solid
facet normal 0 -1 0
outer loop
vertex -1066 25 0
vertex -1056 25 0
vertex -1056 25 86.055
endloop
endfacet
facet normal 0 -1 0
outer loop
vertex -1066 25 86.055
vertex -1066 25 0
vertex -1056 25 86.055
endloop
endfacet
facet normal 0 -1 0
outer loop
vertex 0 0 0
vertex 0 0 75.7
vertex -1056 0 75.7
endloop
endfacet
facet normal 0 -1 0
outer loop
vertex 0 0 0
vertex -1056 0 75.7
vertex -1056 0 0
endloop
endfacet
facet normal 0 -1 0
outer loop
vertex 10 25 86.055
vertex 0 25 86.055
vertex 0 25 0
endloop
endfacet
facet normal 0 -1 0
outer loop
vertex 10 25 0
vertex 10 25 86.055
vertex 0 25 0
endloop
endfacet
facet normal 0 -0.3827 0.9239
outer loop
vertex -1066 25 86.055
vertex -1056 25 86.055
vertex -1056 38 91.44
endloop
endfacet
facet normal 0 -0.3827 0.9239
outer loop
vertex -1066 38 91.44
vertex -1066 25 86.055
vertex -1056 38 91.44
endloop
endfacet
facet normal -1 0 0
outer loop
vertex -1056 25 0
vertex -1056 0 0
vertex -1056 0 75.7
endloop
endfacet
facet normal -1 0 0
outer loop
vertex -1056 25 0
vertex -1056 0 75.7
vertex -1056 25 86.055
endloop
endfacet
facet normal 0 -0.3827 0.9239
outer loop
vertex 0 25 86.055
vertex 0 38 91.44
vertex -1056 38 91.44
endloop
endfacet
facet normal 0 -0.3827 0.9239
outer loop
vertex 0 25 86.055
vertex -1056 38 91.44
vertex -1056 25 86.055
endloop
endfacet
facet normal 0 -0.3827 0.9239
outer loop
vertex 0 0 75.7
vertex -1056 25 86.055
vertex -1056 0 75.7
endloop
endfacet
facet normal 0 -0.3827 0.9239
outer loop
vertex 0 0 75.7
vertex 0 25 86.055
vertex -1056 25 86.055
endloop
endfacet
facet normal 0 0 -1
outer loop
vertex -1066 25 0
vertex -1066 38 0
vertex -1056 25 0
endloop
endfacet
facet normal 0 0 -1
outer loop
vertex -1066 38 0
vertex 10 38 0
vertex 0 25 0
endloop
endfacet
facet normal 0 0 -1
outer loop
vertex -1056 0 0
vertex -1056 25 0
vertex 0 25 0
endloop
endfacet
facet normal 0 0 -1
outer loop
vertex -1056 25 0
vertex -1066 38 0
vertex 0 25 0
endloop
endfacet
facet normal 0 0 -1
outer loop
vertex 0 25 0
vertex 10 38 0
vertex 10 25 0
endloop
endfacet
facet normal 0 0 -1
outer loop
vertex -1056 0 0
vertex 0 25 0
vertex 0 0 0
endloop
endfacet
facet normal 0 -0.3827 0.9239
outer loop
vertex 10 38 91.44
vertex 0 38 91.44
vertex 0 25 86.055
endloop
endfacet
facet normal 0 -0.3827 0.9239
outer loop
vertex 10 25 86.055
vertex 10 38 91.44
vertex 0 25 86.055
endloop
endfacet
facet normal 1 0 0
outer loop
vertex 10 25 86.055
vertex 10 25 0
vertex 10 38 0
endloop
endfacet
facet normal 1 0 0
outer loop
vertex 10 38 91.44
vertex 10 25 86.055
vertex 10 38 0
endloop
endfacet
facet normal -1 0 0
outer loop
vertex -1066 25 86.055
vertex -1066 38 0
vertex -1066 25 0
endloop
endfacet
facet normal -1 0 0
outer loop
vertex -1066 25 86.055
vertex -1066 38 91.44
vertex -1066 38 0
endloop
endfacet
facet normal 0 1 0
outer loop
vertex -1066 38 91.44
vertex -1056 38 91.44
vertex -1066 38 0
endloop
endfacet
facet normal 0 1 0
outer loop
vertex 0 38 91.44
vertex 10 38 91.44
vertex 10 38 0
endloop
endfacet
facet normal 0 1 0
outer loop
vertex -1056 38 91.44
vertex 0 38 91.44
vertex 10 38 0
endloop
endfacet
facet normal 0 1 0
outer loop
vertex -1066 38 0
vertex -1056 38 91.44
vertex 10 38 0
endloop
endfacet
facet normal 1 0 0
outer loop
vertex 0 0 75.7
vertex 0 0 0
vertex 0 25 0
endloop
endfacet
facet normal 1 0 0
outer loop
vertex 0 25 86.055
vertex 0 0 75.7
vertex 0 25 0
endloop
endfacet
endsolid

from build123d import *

# Parameters (mm, degrees)
F1_DEPTH = 1056
F3_DEPTH = 10
F5_DEPTH = 10


with BuildPart() as f1:
    # F0 (on Right) → F1 (new body)
    with BuildSketch(Plane.YZ):
        Polygon((0, 75.7), (0, 0), (38, 0), (38, 91.440115), align=None)
    extrude(amount=-F1_DEPTH)

    # F2 (on face) → F3 (join)
    with BuildSketch(Plane.YZ):
        Polygon((25, 86.055339), (25, 0), (38, 0), (38, 91.440115), align=None)
    extrude(amount=F3_DEPTH)

    # F4 (on face) → F5 (join)
    with BuildSketch(Plane(origin=(-1056, 0, 0), x_dir=(0, -1, 0), z_dir=(-1, 0, 0))):
        Polygon((-38, 0), (-25, 0), (-25, 86.055339), (-38, 91.440115), align=None)
    extrude(amount=F5_DEPTH)


solid = f1.part
